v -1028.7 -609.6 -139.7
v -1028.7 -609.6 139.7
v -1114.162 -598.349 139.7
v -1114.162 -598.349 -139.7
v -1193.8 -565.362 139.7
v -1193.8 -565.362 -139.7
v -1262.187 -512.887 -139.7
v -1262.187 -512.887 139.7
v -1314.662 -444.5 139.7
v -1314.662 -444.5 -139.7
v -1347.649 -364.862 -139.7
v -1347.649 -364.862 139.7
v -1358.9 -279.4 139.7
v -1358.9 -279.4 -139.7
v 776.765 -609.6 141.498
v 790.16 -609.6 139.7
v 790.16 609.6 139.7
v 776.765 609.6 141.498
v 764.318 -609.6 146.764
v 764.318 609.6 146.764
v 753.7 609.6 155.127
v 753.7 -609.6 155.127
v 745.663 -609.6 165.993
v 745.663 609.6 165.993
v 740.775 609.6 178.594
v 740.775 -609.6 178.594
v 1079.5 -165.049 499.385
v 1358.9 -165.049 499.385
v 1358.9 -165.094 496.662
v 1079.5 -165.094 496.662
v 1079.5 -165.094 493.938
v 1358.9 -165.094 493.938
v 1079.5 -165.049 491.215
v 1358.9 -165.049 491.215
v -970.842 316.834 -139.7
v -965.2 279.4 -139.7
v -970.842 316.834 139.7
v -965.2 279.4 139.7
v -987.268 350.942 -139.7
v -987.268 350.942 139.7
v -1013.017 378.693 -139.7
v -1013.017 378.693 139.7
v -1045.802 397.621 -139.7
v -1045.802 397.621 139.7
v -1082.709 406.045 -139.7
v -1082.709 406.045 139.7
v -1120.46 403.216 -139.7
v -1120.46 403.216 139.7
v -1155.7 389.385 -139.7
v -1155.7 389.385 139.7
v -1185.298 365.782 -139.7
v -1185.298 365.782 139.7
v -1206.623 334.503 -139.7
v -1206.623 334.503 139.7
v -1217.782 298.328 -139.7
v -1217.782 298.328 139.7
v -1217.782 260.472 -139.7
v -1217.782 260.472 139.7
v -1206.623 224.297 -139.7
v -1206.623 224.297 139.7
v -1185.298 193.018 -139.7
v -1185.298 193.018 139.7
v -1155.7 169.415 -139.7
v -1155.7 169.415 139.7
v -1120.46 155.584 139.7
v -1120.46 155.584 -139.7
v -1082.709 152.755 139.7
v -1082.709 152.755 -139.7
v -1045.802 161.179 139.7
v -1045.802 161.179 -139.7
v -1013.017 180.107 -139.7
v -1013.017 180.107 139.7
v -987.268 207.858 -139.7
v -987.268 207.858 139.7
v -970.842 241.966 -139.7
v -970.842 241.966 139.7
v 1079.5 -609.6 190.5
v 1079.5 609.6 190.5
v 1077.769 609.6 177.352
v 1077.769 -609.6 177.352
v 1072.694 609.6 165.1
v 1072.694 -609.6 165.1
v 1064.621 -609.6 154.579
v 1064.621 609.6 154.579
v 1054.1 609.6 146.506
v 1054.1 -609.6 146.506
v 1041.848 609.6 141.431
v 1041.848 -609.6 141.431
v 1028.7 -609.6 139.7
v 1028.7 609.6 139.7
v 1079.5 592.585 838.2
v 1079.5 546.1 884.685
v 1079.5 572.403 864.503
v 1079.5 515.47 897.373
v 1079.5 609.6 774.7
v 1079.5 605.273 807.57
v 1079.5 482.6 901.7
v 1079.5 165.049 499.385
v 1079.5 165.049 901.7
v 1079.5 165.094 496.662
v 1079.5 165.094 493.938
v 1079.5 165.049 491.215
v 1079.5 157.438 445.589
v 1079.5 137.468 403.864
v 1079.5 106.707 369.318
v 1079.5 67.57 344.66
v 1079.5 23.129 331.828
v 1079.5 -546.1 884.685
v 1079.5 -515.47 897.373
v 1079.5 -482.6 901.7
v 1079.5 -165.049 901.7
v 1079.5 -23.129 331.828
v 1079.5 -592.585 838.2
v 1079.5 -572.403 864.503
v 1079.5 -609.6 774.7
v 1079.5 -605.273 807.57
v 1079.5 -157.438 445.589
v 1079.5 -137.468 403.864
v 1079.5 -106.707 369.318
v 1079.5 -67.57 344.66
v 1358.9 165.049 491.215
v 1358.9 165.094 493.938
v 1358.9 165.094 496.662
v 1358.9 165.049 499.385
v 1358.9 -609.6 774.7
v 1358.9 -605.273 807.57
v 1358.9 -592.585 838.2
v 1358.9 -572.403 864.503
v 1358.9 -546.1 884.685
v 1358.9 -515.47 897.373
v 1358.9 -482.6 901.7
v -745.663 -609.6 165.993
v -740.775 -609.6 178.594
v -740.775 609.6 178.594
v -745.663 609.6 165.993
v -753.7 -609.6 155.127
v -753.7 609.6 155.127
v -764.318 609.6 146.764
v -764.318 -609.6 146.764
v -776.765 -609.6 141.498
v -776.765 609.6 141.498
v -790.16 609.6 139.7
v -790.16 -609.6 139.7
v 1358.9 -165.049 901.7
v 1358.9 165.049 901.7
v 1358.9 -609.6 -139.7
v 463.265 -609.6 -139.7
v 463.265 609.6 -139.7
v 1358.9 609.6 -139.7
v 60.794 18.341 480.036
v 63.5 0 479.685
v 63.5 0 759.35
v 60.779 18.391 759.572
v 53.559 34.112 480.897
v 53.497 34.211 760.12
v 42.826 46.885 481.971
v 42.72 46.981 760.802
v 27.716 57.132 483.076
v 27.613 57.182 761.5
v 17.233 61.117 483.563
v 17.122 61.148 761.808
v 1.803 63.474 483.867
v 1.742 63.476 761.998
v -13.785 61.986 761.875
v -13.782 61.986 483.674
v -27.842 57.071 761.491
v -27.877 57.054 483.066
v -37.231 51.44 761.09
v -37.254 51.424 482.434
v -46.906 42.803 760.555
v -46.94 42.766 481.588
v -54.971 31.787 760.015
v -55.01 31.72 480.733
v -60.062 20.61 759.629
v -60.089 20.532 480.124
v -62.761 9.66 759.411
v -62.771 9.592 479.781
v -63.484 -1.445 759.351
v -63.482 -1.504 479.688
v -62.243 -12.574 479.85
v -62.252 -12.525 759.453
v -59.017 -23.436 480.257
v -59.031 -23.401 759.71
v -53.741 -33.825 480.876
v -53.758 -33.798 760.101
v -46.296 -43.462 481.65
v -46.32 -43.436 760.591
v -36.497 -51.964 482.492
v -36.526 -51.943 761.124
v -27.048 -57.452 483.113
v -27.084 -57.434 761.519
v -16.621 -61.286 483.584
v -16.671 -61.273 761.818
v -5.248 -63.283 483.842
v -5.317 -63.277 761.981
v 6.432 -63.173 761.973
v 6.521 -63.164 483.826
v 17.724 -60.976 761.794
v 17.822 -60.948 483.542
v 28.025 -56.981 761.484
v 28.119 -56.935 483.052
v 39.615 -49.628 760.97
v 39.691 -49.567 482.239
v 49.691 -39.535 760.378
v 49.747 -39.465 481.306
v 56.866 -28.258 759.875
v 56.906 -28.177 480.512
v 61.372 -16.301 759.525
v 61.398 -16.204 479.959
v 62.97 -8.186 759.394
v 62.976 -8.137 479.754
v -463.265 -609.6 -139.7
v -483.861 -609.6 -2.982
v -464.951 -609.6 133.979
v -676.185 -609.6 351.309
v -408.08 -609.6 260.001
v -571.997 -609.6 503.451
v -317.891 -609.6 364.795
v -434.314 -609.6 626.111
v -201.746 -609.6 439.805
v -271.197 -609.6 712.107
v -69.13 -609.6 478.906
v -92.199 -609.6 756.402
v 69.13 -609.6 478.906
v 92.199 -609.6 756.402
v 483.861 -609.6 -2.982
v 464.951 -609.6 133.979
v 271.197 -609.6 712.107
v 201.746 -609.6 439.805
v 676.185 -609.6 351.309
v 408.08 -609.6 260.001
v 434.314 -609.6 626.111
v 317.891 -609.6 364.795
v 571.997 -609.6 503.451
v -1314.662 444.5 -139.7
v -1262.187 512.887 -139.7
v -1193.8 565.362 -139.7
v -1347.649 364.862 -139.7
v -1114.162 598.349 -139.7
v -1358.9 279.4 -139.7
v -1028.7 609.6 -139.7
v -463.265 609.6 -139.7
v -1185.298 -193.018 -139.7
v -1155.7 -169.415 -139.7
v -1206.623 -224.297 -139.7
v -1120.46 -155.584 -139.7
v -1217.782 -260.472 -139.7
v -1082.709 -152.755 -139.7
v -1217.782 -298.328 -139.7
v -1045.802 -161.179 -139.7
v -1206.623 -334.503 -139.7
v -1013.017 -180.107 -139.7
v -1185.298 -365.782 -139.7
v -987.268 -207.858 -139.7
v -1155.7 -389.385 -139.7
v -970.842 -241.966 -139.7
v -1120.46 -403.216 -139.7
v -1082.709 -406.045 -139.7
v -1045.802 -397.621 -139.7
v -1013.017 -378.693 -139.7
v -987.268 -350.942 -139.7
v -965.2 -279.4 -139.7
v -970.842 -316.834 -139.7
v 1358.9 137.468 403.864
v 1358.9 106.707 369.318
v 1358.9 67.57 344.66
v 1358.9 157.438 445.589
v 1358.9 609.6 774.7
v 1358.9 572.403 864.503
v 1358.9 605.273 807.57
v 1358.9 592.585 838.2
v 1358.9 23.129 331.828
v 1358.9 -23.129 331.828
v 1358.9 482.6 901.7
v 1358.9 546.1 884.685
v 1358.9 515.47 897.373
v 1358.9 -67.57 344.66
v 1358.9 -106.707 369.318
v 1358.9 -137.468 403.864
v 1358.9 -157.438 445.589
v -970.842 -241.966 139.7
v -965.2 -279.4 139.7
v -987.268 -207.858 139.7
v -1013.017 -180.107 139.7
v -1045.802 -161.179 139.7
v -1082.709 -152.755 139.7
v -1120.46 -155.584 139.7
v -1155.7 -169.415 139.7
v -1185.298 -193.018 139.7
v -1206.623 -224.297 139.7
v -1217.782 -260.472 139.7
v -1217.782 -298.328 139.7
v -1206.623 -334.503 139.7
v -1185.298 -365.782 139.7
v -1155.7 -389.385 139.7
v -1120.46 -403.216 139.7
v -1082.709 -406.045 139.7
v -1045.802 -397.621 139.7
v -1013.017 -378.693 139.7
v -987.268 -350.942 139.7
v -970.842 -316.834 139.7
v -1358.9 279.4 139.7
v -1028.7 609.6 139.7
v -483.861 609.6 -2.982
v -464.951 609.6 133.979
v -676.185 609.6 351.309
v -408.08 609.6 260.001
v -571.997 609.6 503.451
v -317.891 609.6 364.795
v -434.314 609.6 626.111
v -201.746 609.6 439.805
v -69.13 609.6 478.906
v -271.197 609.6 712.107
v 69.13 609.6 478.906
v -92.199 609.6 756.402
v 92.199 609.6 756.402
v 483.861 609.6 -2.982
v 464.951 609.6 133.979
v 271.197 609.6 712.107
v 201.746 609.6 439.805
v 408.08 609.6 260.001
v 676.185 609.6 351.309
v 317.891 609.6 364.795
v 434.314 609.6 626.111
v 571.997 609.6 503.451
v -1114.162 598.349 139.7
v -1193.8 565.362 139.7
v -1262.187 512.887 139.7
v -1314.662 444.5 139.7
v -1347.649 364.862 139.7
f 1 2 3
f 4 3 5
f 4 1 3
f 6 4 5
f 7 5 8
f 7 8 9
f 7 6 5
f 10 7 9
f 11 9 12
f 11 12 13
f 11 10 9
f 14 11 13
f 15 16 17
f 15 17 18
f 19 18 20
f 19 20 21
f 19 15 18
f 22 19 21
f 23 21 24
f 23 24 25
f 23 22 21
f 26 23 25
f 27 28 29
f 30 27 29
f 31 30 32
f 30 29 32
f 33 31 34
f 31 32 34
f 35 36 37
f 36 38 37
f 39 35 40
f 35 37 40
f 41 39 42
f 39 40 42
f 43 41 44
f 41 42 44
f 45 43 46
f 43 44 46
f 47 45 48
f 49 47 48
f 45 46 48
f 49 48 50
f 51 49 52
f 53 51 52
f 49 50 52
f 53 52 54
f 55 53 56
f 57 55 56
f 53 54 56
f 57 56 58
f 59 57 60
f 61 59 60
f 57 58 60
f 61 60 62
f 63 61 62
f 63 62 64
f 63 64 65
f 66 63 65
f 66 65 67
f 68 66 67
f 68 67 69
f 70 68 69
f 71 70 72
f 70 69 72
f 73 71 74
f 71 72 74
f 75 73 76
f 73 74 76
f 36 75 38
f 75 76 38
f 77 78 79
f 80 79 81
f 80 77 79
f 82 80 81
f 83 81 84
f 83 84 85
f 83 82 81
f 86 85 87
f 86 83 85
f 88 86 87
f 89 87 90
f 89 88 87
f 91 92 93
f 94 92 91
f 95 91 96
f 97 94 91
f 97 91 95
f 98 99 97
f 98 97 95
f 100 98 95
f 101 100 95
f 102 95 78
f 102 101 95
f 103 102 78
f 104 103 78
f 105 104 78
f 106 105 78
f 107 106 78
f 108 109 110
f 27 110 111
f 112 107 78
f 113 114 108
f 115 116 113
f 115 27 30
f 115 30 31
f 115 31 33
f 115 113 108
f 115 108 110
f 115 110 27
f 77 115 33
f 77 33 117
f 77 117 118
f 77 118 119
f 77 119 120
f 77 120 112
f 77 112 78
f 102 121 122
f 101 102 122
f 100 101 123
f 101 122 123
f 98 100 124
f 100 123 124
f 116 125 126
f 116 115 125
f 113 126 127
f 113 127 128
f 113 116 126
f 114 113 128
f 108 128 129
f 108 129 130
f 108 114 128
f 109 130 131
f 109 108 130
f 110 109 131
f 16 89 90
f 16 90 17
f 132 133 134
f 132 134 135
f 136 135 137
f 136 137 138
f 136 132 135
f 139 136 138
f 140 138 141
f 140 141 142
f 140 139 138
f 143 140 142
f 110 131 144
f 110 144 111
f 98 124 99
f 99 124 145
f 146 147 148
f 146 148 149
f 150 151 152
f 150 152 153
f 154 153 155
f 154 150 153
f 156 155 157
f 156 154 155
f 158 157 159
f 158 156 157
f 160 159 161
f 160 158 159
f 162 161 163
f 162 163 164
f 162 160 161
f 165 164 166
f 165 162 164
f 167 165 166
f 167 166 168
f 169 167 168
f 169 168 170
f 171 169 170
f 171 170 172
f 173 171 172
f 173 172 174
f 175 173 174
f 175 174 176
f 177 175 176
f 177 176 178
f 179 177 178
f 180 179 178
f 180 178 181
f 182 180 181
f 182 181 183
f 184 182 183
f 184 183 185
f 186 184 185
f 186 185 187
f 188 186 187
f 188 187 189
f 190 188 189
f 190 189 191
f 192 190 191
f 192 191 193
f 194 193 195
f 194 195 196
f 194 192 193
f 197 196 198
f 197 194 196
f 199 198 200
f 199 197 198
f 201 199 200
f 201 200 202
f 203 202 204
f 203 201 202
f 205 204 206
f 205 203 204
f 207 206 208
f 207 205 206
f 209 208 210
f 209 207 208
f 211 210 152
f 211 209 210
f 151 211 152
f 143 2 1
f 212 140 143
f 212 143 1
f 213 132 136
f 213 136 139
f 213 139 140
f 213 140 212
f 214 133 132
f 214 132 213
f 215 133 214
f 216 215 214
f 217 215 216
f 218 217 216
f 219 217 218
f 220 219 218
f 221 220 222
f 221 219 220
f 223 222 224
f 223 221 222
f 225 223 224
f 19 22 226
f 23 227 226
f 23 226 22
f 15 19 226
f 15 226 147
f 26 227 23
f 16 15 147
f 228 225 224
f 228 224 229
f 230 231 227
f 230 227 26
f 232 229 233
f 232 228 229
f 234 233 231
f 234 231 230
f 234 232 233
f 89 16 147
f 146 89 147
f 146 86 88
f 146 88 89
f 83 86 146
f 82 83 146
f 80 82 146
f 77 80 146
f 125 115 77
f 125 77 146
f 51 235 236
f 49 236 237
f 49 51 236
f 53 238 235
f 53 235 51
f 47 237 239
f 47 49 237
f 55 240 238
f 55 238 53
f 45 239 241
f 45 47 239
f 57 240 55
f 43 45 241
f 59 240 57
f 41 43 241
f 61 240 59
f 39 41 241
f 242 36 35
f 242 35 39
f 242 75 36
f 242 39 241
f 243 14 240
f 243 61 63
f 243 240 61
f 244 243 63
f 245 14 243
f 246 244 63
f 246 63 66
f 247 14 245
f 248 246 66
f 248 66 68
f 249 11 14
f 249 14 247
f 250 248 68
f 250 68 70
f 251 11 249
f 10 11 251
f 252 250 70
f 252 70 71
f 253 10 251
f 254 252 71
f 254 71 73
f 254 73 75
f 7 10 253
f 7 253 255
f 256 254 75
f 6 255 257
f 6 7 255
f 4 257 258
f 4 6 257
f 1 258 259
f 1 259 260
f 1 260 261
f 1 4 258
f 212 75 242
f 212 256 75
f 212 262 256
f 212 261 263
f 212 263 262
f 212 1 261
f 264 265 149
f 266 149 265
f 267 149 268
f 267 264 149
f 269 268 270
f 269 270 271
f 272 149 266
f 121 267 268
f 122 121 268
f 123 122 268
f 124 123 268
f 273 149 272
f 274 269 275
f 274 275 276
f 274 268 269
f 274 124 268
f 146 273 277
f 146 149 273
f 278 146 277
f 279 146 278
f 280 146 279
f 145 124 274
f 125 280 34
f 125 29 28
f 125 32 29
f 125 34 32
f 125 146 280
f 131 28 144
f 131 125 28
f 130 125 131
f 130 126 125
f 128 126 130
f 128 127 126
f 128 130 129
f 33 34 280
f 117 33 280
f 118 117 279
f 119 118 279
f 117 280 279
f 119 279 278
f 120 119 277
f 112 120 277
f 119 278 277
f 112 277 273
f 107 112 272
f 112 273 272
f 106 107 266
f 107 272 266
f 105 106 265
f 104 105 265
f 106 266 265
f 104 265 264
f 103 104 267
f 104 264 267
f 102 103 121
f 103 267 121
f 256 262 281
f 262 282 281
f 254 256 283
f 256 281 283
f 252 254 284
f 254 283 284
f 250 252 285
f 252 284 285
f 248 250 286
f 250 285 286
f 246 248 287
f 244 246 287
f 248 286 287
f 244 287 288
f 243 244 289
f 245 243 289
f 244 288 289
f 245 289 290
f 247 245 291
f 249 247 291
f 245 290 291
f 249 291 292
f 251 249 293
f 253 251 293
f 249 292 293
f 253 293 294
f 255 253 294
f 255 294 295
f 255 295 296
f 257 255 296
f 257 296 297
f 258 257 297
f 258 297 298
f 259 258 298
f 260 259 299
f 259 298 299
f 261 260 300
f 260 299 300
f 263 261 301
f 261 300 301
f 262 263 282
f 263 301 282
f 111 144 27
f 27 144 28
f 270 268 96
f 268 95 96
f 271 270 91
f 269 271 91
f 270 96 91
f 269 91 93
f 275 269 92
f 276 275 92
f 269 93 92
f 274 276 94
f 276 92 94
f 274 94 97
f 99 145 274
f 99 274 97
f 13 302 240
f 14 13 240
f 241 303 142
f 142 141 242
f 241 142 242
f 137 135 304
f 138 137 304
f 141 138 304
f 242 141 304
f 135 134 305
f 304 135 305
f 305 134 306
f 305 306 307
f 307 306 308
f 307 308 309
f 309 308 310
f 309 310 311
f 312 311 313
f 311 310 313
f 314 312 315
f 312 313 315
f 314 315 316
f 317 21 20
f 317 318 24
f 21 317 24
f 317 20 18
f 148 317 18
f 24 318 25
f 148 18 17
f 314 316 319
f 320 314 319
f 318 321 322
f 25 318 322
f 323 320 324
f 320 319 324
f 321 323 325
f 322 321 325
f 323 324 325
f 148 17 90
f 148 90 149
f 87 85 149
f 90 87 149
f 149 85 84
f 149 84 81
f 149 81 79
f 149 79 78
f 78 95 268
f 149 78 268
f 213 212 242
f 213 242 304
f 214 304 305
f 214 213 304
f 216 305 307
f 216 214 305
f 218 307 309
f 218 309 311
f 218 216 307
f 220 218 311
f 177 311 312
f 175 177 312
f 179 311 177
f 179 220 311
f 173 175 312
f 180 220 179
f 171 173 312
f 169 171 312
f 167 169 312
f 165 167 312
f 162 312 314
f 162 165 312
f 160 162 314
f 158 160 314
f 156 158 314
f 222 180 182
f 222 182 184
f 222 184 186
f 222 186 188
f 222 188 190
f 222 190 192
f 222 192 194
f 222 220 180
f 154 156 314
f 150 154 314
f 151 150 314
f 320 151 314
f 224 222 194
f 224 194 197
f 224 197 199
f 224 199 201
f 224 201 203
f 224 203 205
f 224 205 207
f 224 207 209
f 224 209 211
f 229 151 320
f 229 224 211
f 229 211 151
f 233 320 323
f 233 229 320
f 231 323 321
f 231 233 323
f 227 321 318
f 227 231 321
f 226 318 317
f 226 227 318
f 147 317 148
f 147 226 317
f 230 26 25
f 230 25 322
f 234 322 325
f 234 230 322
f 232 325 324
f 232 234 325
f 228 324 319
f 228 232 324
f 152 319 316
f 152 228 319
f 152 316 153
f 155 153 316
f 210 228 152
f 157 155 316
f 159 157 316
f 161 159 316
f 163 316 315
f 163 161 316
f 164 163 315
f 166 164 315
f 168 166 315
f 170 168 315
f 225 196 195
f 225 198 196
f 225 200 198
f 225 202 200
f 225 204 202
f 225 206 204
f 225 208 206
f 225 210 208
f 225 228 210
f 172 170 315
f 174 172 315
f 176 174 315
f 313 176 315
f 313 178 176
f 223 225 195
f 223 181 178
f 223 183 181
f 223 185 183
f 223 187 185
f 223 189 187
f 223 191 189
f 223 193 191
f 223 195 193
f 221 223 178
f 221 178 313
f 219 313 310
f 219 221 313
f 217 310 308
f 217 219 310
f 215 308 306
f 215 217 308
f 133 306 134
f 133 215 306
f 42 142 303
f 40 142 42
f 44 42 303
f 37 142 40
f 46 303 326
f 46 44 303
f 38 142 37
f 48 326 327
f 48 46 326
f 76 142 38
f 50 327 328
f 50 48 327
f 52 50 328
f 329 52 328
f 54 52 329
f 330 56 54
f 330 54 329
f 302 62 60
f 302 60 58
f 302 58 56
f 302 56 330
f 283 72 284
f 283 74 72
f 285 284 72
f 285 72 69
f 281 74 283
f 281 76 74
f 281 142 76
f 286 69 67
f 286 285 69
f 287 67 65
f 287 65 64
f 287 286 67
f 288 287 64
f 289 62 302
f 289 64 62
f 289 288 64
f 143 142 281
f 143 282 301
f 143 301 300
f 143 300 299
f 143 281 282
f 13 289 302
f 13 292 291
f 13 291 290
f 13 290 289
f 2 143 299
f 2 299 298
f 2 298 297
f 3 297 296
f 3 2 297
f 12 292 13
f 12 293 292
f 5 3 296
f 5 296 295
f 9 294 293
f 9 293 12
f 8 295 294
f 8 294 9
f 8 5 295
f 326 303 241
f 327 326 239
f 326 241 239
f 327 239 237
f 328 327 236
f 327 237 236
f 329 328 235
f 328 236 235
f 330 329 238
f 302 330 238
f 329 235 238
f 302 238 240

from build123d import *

# Parameters (mm, degrees)
F1_DEPTH      = 609.6
F2_R          = 63.5
F2_R_2        = 127
F3_DEPTH      = 901.701
F3_DEPTH_BACK = 139.701
F5_DEPTH      = 279.4
F6_R          = 127
F7_R          = 330.2


with BuildPart() as f1:
    # F0 (on Front) → F1 (new body, symmetric)
    with BuildSketch(Plane.XZ):
        with BuildLine():
            ThreePointArc((1079.5, 190.5), (1064.621024, 154.578976), (1028.7, 139.7))
            Line((1028.7, 139.7), (790.160484, 139.7))
            ThreePointArc((790.160484, 139.7), (758.729587, 150.590869), (740.775453, 178.59375))
            ThreePointArc((740.775453, 178.59375), (0, 762), (-740.775453, 178.59375))
            ThreePointArc((-740.775453, 178.59375), (-758.729587, 150.590869), (-790.160484, 139.7))
            Line((-790.160484, 139.7), (-1358.9, 139.7))
            Line((-1358.9, 139.7), (-1358.9, -139.7))
            Line((-1358.9, -139.7), (-463.264597, -139.7))
            ThreePointArc((-463.264597, -139.7), (0, 483.87), (463.264597, -139.7))
            Line((463.264597, -139.7), (1358.9, -139.7))
            Line((1358.9, -139.7), (1358.9, 901.7))
            Line((1358.9, 901.7), (1079.5, 901.7))
            Line((1079.5, 901.7), (1079.5, 190.5))
        make_face()
    extrude(amount=F1_DEPTH, both=True)

    # F2 (on Top) → F3 (cut, two sides)
    with BuildSketch(Plane.XY) as f3_sk:
        Circle(F2_R)
        with Locations((-1092.2, 279.4)):
            Circle(F2_R_2)
        with Locations((-1092.2, -279.4)):
            Circle(F2_R_2)
    extrude(amount=F3_DEPTH, mode=Mode.SUBTRACT)
    extrude(f3_sk.sketch, amount=-F3_DEPTH_BACK, mode=Mode.SUBTRACT)

    # F4 (on face) → F5 (cut, through all)
    with BuildSketch(Plane.YZ.offset(1358.9)):
        with BuildLine():
            Line((-165.049463, 491.215308), (-165.049463, 499.384692))
            ThreePointArc((-165.049463, 499.384692), (-165.1, 495.3), (-165.049463, 491.215308))
        make_face()
        with BuildLine():
            Line((-165.049463, 901.7), (-165.049463, 499.384692))
            Line((-165.049463, 499.384692), (-165.049463, 491.215308))
            ThreePointArc((-165.049463, 491.215308), (0, 330.2), (165.049463, 491.215308))
            Line((165.049463, 491.215308), (165.049463, 499.384692))
            Line((165.049463, 499.384692), (165.049463, 901.7))
            Line((165.049463, 901.7), (-165.049463, 901.7))
        make_face()
        with BuildLine():
            Line((165.049463, 499.384692), (165.049463, 491.215308))
            ThreePointArc((165.049463, 491.215308), (165.1, 495.3), (165.049463, 499.384692))
        make_face()
    extrude(amount=-F5_DEPTH, mode=Mode.SUBTRACT)

    # F6
    f6_edges = [f1.edges().sort_by_distance(p)[0] for p in [
        (1219.2, 609.6, 901.7),
        (1219.2, -609.6, 901.7),
    ]]
    fillet(f6_edges, radius=F6_R)

    # F7
    f7_edges = [f1.edges().sort_by_distance(p)[0] for p in [
        (-1358.9, 609.6, 0),
        (-1358.9, -609.6, 0),
    ]]
    fillet(f7_edges, radius=F7_R)


solid = f1.part
